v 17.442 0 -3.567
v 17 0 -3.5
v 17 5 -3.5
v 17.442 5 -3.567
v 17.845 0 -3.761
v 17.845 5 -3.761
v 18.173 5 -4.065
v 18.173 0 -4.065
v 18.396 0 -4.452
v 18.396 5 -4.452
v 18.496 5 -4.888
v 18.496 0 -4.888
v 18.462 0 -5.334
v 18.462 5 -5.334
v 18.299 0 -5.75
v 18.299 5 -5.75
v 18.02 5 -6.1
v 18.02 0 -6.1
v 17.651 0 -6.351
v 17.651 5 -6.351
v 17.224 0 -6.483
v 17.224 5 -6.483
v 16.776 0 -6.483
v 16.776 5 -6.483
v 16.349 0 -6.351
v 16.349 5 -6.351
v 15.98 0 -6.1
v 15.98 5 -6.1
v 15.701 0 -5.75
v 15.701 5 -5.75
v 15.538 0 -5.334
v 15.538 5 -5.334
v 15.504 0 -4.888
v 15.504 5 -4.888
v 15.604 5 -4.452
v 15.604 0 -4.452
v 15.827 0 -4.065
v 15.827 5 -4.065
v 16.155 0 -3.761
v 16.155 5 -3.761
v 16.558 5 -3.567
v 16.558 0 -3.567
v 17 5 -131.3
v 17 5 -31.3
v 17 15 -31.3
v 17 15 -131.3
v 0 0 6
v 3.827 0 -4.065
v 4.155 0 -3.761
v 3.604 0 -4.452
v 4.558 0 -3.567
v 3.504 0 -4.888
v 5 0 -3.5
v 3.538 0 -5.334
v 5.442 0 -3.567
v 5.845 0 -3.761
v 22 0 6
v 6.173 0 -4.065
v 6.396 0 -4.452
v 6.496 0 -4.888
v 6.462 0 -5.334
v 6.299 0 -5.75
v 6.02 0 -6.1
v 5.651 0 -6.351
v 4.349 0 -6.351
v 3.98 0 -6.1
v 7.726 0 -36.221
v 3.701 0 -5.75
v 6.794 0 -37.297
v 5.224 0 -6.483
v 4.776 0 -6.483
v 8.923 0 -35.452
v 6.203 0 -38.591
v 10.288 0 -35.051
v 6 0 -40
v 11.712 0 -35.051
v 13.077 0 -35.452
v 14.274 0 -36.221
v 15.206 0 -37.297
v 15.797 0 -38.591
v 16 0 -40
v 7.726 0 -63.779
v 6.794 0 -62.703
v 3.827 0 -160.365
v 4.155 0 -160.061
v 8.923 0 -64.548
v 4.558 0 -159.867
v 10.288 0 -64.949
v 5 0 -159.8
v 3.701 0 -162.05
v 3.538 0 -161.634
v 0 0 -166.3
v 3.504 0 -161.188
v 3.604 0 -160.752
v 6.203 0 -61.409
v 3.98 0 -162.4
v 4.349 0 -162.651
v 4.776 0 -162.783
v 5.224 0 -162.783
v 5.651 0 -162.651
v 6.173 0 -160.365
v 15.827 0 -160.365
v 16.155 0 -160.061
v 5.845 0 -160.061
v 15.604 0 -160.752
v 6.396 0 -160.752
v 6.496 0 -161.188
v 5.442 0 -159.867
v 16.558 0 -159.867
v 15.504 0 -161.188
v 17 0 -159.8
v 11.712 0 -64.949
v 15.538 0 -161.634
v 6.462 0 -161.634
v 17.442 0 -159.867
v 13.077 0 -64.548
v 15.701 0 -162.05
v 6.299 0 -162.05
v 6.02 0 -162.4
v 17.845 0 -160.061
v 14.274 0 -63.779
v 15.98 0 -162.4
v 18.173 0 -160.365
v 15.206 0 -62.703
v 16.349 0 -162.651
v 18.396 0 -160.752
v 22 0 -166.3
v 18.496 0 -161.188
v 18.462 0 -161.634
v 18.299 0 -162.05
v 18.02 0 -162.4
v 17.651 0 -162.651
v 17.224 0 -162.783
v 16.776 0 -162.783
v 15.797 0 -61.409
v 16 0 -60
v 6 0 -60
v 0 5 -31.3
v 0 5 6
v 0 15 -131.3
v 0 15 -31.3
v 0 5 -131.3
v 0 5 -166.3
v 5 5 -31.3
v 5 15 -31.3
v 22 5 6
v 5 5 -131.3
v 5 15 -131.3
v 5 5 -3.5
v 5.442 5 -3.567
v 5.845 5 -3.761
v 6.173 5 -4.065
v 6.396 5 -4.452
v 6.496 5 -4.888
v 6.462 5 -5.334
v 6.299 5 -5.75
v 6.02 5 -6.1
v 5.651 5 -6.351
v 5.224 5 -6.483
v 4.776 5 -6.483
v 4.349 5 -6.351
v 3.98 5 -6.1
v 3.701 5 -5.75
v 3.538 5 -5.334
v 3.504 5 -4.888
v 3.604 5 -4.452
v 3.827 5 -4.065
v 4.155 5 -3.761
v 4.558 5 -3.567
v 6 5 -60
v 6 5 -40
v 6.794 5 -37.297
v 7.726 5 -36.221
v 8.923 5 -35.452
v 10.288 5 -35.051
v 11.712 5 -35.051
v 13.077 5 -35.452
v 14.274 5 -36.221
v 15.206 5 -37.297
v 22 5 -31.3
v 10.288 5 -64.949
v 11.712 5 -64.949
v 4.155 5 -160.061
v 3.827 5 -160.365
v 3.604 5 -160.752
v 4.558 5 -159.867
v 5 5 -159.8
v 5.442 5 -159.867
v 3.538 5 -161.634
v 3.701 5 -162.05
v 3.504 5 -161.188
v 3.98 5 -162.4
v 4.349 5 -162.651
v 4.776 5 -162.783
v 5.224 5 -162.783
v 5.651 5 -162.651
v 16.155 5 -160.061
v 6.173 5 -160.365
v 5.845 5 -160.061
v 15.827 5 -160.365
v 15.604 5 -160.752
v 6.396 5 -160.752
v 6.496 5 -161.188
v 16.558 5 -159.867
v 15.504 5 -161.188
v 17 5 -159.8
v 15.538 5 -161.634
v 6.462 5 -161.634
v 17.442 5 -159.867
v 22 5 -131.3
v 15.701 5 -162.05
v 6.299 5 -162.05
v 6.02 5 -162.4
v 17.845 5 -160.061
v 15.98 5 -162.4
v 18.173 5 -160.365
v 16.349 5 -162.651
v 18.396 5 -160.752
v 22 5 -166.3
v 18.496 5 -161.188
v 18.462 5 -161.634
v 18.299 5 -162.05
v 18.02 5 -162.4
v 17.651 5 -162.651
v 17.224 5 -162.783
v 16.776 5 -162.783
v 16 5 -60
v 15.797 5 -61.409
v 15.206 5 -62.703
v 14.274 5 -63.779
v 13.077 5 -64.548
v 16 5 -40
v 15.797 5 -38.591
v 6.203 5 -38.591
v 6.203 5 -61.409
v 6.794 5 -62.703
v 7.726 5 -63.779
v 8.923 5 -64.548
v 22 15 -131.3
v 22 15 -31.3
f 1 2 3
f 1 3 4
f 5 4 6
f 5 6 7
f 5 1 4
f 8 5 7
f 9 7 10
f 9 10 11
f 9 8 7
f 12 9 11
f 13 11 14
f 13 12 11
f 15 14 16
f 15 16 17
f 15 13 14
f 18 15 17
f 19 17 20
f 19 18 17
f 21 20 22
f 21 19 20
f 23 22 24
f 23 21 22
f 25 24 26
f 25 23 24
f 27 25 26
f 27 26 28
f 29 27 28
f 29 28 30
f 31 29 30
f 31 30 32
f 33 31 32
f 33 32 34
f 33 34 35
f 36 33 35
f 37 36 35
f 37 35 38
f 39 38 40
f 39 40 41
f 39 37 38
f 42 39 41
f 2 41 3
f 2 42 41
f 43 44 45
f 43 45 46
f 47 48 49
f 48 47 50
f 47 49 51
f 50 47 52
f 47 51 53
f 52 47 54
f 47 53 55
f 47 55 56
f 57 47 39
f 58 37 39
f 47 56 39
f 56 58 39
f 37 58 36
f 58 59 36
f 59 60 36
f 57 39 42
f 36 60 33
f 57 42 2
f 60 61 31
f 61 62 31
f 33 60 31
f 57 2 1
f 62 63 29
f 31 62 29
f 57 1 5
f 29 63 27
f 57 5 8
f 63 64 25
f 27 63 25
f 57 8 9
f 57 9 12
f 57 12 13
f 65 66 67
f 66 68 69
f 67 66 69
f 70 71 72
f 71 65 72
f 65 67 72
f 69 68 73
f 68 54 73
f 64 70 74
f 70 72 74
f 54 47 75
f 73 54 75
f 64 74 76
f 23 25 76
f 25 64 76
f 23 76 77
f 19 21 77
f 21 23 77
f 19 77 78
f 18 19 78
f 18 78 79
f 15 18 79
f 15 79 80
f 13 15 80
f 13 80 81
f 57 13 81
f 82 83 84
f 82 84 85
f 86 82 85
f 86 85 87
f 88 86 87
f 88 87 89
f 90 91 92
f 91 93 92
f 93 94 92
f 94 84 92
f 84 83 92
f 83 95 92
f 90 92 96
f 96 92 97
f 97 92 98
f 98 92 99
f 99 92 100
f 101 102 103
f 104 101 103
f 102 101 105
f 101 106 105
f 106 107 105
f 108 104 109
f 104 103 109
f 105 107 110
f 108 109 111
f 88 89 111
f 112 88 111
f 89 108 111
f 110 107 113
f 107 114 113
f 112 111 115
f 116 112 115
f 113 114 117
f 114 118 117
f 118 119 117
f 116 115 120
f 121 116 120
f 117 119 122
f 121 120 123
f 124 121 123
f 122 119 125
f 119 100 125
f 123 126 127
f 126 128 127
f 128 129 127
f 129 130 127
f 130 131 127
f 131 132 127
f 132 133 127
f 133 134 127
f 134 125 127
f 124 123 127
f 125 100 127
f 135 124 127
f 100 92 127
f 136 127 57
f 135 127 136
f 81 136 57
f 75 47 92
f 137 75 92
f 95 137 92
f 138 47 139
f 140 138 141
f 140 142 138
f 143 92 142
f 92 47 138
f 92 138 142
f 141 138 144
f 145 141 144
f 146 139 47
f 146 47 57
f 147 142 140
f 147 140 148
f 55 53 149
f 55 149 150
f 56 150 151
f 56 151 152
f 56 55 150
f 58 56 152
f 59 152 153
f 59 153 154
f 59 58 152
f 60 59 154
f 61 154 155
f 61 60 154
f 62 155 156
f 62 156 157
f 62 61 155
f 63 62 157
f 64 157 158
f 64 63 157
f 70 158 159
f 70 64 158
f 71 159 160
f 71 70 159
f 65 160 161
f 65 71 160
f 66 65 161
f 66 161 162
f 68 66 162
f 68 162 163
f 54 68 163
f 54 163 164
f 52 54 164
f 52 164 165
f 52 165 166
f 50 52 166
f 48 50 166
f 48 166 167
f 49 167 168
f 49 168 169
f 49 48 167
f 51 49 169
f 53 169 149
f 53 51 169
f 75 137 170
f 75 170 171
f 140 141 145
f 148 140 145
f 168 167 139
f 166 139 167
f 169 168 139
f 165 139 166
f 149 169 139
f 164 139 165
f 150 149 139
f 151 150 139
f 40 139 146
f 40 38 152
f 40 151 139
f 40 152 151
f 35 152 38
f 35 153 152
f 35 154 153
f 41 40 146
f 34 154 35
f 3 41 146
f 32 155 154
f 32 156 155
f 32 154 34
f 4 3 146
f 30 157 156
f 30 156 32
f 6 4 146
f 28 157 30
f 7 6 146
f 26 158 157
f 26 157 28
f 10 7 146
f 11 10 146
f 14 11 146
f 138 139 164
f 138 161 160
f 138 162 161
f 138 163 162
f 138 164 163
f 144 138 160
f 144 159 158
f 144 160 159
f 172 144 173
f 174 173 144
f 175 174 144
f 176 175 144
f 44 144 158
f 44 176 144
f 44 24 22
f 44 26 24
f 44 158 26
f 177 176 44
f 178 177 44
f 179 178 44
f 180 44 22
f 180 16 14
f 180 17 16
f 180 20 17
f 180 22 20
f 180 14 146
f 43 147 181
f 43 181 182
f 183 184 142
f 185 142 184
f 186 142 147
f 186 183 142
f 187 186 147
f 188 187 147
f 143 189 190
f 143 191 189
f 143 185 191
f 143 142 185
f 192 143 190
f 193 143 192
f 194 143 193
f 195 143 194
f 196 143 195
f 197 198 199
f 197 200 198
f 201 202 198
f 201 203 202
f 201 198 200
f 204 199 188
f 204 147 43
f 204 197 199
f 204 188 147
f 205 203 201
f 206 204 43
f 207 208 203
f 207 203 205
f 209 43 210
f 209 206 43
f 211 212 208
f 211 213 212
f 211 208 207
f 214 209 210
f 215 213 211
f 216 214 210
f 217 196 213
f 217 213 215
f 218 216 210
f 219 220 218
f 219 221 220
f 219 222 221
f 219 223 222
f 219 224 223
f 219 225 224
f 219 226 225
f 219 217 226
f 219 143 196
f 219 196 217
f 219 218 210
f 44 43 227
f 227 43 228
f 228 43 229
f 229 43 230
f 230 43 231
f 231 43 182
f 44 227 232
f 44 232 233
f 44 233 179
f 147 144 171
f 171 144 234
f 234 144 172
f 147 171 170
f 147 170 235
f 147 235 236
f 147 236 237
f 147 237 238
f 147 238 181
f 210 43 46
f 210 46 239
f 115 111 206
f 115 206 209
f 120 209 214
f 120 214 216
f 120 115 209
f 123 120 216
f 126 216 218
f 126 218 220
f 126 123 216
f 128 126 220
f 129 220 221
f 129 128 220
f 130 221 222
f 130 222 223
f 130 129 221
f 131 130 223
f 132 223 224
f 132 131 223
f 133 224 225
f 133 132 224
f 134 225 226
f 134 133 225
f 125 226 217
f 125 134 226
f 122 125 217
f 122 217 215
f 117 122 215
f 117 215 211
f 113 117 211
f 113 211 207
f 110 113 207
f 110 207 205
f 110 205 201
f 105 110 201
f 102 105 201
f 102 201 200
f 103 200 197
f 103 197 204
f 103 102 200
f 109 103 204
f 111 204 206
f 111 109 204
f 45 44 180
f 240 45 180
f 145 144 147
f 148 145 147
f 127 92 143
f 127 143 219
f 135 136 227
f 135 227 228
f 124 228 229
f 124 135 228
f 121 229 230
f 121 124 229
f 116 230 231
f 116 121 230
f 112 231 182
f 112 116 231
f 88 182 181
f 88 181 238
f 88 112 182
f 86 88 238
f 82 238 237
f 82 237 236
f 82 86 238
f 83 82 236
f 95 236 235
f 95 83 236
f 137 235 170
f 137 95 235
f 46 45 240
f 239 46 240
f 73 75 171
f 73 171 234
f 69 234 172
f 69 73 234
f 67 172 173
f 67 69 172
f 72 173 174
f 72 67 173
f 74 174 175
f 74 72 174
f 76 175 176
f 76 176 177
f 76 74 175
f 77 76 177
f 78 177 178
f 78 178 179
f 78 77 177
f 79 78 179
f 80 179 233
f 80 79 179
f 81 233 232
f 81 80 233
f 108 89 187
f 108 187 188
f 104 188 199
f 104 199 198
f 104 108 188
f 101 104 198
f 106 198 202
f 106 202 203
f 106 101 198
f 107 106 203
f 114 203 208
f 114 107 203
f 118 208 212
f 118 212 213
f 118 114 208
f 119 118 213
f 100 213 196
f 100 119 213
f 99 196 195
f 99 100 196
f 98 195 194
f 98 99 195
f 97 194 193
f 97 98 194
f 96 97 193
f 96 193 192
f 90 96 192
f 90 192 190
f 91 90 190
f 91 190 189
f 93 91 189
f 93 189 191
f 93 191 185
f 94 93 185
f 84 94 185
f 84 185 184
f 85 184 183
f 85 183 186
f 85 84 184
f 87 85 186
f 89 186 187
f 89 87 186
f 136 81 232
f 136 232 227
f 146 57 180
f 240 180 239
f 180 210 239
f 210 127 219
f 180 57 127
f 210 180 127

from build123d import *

# Parameters (mm, degrees)
SKETCH1_W           = 22
SKETCH1_H           = 166.3
SKETCH1_R           = 1.5
BOSS_EXTRUDE1_DEPTH = 5
CUT_EXTRUDE1_DEPTH  = 5
SKETCH3_W           = 22
SKETCH3_H           = 5
BOSS_EXTRUDE2_DEPTH = 6
SKETCH4_W           = 5
SKETCH4_H           = 100
BOSS_EXTRUDE3_DEPTH = 10


with BuildPart() as part:
    # Sketch1 → Boss-Extrude1 (new body)
    with BuildSketch(Plane(origin=(0, 0, 0), x_dir=(1, 0, 0), z_dir=(0, 1, 0))):
        with Locations((11, 83.15)):
            Rectangle(SKETCH1_W, SKETCH1_H)
        with Locations(Location((5, 161.3, 0), (0, 0, 270))):
            Circle(SKETCH1_R, mode=Mode.SUBTRACT)
        with Locations(Location((17, 161.3, 0), (0, 0, 270))):
            Circle(SKETCH1_R, mode=Mode.SUBTRACT)
        with Locations(Location((17, 5, 0), (0, 0, 270))):
            Circle(SKETCH1_R, mode=Mode.SUBTRACT)
        with Locations(Location((5, 5, 0), (0, 0, 270))):
            Circle(SKETCH1_R, mode=Mode.SUBTRACT)
    extrude(amount=BOSS_EXTRUDE1_DEPTH)

    # Sketch2 → Cut-Extrude1 (cut)
    with BuildSketch(Plane(origin=(0, 0, 0), x_dir=(-1, 0, 0), z_dir=(0, -1, 0))):
        with BuildLine():
            Line((-16, 40), (-16, 60))
            ThreePointArc((-16, 60), (-11, 65), (-6, 60))
            Line((-6, 60), (-6, 40))
            ThreePointArc((-6, 40), (-11, 35), (-16, 40))
        make_face()
    extrude(amount=-CUT_EXTRUDE1_DEPTH, mode=Mode.SUBTRACT)

    # Sketch3 → Boss-Extrude2 (add)
    with BuildSketch(Plane.XY):
        with Locations((11, 2.5)):
            Rectangle(SKETCH3_W, SKETCH3_H)
    extrude(amount=BOSS_EXTRUDE2_DEPTH)

    # Sketch4 → Boss-Extrude3 (add)
    with BuildSketch(Plane(origin=(0, 5, 0), x_dir=(1, 0, 0), z_dir=(0, 1, 0))):
        with Locations((2.5, 81.3)):
            Rectangle(SKETCH4_W, SKETCH4_H)
        with Locations((19.5, 81.3)):
            Rectangle(SKETCH4_W, SKETCH4_H)
    extrude(amount=BOSS_EXTRUDE3_DEPTH)


solid = part.part
